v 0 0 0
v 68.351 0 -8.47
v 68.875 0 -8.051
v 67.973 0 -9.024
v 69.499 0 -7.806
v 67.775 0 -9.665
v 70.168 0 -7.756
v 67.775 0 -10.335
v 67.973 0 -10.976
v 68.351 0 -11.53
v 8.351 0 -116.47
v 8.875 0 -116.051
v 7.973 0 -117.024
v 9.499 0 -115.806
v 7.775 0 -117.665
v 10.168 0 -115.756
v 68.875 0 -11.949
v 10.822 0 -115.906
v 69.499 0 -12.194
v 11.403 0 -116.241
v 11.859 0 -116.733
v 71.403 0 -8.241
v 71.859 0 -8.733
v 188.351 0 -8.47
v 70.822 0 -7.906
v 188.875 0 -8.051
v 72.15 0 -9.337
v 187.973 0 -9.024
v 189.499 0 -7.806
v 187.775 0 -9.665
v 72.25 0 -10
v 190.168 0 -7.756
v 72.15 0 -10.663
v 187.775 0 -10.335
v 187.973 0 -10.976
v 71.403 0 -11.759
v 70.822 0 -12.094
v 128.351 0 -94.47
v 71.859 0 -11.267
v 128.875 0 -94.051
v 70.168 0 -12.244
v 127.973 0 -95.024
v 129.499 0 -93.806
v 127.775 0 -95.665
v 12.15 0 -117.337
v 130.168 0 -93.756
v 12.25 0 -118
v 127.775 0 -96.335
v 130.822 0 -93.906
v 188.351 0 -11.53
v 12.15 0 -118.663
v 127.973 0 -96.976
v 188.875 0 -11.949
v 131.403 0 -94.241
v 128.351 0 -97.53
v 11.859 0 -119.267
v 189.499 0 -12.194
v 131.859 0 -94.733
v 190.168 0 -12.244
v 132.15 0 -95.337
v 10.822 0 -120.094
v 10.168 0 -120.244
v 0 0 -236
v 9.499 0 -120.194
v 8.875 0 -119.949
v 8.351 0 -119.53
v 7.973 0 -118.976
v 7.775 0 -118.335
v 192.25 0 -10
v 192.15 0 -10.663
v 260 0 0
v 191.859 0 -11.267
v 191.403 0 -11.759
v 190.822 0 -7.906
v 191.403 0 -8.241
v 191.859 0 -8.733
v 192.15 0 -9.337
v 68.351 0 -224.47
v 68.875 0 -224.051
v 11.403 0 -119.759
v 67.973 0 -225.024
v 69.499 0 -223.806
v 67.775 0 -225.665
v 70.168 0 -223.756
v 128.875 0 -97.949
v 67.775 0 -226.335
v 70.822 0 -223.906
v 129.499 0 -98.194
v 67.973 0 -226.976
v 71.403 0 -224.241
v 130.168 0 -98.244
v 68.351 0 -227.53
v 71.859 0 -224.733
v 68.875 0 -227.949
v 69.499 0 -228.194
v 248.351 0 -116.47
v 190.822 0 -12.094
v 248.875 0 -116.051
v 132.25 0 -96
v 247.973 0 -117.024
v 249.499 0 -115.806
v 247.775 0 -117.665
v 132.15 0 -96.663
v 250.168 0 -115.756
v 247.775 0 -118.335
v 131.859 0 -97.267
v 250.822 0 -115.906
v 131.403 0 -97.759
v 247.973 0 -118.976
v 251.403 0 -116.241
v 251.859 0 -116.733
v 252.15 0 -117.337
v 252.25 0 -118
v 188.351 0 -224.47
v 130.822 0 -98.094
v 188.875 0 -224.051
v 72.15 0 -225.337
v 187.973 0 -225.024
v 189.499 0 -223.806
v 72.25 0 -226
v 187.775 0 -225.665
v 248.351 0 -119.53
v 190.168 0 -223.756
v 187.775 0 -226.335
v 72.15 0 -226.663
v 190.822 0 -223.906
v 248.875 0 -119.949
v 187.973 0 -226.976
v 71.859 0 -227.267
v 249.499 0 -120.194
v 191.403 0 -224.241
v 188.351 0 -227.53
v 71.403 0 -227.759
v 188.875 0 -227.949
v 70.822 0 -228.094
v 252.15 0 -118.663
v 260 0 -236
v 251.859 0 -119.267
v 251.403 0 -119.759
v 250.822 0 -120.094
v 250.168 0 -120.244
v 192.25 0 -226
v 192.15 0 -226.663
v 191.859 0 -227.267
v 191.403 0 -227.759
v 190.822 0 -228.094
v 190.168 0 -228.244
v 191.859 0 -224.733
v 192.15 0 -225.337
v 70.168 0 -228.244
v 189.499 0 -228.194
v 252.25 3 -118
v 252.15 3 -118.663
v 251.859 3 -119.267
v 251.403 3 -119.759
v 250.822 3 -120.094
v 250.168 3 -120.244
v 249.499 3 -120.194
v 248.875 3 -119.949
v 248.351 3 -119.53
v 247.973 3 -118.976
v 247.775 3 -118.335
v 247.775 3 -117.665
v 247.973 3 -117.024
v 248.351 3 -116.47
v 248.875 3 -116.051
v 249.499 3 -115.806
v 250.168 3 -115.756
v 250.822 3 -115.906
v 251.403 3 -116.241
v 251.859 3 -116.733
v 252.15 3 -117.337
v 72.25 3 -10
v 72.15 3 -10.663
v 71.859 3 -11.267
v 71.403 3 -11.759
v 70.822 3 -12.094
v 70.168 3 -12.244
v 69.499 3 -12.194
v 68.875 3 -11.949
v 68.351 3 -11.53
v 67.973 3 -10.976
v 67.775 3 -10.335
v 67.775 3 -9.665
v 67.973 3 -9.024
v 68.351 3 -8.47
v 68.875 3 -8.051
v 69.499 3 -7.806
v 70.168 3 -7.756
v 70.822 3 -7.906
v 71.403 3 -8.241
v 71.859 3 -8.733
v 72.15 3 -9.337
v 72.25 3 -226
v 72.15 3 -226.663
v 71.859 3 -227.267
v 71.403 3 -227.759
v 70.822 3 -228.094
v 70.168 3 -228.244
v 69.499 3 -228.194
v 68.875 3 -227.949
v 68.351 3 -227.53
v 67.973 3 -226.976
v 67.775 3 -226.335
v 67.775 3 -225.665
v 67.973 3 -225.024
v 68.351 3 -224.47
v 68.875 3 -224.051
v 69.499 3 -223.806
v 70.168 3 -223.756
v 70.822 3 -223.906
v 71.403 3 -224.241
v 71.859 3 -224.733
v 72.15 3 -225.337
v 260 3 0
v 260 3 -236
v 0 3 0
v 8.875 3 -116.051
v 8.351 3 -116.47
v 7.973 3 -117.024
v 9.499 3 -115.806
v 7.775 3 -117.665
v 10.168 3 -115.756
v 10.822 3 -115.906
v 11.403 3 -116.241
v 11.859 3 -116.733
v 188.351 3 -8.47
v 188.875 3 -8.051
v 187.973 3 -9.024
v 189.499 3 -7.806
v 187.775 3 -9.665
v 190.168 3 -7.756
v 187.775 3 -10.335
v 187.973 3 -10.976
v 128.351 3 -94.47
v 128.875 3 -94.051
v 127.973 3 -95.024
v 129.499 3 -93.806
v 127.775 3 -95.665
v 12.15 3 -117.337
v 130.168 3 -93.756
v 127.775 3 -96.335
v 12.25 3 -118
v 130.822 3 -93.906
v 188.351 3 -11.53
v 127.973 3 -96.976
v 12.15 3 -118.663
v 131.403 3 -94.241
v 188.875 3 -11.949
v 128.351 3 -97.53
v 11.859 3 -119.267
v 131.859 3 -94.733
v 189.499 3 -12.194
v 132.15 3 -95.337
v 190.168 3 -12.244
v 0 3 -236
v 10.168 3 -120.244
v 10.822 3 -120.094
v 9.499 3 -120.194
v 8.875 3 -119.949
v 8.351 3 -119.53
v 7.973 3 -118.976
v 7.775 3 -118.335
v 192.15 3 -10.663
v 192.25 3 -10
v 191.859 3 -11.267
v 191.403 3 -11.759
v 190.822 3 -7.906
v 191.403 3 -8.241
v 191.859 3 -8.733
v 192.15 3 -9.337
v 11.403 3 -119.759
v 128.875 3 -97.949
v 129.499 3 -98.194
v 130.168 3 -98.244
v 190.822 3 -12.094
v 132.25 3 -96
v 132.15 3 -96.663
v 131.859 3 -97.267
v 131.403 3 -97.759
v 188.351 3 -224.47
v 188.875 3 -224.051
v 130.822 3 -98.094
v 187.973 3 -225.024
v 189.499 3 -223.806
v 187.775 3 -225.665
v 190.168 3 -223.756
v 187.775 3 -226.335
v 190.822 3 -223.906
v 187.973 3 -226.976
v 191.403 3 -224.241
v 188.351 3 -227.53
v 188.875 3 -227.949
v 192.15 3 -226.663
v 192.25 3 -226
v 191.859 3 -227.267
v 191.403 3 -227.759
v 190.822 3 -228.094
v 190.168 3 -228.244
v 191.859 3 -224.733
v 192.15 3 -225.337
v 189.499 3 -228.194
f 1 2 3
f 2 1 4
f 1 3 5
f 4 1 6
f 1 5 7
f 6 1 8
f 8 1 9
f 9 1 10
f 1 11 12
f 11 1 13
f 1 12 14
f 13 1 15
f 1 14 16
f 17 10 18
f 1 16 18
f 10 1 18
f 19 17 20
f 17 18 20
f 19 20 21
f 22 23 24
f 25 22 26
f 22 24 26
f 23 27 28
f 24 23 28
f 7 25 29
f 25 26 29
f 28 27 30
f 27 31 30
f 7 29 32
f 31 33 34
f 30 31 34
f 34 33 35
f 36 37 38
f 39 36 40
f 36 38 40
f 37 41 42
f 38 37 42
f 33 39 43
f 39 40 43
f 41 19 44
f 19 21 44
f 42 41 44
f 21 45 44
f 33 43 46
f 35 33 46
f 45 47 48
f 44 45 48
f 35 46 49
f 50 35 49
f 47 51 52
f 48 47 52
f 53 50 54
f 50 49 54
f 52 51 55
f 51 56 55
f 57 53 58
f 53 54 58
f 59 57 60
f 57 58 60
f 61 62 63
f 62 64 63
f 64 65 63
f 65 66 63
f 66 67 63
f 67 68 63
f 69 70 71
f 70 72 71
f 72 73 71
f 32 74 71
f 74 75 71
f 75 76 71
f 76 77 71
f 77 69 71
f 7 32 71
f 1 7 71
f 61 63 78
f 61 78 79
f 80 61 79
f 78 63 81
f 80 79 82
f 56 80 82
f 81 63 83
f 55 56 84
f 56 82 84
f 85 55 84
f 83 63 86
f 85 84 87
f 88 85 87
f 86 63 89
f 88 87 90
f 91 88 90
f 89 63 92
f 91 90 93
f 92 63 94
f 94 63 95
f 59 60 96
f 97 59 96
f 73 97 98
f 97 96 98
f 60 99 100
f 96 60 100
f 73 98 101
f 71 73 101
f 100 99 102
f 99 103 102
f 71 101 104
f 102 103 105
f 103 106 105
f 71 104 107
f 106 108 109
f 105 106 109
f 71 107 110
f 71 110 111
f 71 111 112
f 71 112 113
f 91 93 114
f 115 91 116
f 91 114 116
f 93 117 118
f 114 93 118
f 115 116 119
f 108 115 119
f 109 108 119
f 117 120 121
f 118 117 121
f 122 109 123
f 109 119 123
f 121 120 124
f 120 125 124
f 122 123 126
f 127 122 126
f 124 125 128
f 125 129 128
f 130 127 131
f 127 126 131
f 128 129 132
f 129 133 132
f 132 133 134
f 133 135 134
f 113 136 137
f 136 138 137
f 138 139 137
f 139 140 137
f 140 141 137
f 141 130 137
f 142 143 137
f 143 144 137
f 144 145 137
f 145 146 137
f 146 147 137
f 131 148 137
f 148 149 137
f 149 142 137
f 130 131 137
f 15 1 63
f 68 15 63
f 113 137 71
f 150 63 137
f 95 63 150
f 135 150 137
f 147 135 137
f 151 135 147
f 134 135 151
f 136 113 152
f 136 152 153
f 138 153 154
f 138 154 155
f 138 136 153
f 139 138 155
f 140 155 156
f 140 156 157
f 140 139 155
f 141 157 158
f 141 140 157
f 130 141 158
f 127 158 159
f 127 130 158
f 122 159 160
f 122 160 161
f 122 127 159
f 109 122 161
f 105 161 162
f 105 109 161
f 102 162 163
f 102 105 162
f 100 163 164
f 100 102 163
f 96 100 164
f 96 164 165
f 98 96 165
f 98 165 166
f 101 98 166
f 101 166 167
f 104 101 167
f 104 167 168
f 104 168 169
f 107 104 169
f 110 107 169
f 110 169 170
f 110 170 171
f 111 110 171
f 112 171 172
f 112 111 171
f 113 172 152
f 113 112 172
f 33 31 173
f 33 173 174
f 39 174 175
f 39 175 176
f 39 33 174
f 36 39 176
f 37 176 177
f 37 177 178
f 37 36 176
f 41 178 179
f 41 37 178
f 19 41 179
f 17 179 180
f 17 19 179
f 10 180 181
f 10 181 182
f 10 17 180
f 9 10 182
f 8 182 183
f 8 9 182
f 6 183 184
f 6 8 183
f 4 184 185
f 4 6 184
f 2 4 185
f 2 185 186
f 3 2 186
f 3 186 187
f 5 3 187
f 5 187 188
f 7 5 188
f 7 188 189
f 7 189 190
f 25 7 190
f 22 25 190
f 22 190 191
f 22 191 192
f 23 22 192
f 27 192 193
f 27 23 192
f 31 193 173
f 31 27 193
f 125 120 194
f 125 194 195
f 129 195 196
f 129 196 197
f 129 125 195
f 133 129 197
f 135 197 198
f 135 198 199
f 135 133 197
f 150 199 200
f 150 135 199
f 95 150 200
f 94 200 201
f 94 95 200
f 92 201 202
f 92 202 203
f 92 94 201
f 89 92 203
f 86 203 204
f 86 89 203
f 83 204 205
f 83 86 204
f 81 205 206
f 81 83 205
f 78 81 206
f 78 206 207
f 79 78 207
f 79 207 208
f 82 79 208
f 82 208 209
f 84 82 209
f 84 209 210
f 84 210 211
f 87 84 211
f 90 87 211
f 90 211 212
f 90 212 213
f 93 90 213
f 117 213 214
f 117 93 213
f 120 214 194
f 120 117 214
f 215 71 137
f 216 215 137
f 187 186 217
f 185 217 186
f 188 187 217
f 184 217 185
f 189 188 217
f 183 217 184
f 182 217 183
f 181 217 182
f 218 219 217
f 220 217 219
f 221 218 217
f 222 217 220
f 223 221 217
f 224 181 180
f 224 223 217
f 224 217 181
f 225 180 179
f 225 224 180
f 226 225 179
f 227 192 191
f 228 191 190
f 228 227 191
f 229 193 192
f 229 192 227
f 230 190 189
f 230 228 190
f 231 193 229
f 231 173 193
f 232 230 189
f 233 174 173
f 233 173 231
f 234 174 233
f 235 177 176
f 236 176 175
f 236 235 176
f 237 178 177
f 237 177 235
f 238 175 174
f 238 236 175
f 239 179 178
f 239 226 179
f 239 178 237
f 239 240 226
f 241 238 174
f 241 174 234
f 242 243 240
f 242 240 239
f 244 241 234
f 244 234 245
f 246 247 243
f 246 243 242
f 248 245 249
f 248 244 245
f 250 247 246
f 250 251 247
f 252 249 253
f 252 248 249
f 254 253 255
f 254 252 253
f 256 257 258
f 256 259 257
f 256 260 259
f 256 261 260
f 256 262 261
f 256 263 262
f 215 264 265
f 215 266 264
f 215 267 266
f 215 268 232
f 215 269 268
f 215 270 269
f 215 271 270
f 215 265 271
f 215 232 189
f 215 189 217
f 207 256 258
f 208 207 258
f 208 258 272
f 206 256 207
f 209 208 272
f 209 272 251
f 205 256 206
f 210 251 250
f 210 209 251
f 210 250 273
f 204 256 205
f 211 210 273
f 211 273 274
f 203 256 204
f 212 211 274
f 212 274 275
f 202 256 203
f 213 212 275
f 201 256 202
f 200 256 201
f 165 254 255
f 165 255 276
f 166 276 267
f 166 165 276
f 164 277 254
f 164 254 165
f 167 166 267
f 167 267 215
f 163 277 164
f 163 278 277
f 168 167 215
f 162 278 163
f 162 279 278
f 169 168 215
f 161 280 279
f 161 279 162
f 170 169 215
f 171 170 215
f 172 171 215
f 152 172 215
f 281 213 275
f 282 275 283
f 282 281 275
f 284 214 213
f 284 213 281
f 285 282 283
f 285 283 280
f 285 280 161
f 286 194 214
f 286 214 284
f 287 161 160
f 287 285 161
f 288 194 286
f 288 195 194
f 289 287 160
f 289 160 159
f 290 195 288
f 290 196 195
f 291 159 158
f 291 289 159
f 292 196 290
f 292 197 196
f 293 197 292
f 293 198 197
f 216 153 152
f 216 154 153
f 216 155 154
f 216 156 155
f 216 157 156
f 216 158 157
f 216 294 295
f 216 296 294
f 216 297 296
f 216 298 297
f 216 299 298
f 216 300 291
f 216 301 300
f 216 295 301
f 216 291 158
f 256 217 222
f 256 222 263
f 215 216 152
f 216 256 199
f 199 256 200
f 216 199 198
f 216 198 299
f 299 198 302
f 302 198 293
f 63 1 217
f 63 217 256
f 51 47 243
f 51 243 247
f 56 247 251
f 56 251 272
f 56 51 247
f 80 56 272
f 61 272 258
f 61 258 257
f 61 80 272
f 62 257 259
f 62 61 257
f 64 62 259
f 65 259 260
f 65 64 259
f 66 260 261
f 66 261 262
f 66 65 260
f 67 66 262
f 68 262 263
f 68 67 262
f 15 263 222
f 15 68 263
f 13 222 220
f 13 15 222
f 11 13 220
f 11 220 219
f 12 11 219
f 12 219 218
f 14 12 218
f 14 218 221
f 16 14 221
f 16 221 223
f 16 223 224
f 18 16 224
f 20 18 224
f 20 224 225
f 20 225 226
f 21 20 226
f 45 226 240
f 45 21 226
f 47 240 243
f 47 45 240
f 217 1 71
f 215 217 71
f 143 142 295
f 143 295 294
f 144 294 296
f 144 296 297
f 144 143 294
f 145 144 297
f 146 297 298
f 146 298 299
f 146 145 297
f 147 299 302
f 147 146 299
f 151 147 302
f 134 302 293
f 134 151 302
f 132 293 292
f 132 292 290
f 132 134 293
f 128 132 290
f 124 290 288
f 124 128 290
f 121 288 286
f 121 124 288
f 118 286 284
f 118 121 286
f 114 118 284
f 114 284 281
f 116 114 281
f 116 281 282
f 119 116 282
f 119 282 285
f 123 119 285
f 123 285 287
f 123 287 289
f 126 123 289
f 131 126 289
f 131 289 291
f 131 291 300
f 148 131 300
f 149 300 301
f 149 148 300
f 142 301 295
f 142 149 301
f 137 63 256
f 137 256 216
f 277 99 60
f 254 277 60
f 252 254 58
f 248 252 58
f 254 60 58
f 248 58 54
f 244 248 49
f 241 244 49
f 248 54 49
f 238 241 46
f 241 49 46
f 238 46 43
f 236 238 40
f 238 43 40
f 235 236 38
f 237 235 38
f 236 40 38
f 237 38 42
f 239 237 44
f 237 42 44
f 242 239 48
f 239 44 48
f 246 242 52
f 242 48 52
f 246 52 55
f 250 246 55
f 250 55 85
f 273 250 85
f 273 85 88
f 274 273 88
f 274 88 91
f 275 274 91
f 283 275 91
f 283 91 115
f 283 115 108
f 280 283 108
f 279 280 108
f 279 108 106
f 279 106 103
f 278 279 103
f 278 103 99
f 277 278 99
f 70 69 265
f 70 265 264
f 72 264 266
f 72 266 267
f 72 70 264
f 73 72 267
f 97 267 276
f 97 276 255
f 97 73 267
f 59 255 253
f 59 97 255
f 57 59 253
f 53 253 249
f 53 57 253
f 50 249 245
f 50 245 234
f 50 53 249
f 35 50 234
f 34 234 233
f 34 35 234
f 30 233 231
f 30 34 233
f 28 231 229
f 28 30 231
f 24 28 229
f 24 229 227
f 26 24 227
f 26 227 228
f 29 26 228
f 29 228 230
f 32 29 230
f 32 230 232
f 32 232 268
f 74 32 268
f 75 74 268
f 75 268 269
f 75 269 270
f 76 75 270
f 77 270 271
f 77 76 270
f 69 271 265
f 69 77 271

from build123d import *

# Parameters (mm, degrees)
SKETCH_1_W         = 260
SKETCH_1_H         = 236
SKETCH_1_R         = 2.25
EXTRUDE_1_DEPTH    = 3
SKETCH1_R          = 2.25
CUT_EXTRUDE1_DEPTH = 4


with BuildPart() as part:
    # Эскиз1 → Бобышка-Вытянуть1 (new body)
    with BuildSketch(Plane(origin=(0, 0, 0), x_dir=(1, 0, 0), z_dir=(0, 1, 0))):
        with Locations((130, 118)):
            Rectangle(SKETCH_1_W, SKETCH_1_H)
        with Locations((70, 226)):
            Circle(SKETCH_1_R, mode=Mode.SUBTRACT)
        with Locations((190, 226)):
            Circle(SKETCH_1_R, mode=Mode.SUBTRACT)
        with Locations((10, 118)):
            Circle(SKETCH_1_R, mode=Mode.SUBTRACT)
        with Locations((250, 118)):
            Circle(SKETCH_1_R, mode=Mode.SUBTRACT)
        with Locations((70, 10)):
            Circle(SKETCH_1_R, mode=Mode.SUBTRACT)
        with Locations((190, 10)):
            Circle(SKETCH_1_R, mode=Mode.SUBTRACT)
    extrude(amount=EXTRUDE_1_DEPTH)

    # Sketch1 → Cut-Extrude1 (cut, through all)
    with BuildSketch(Plane.XZ):
        with Locations((130, -96)):
            Circle(SKETCH1_R)
    extrude(amount=-CUT_EXTRUDE1_DEPTH, mode=Mode.SUBTRACT)


solid = part.part
